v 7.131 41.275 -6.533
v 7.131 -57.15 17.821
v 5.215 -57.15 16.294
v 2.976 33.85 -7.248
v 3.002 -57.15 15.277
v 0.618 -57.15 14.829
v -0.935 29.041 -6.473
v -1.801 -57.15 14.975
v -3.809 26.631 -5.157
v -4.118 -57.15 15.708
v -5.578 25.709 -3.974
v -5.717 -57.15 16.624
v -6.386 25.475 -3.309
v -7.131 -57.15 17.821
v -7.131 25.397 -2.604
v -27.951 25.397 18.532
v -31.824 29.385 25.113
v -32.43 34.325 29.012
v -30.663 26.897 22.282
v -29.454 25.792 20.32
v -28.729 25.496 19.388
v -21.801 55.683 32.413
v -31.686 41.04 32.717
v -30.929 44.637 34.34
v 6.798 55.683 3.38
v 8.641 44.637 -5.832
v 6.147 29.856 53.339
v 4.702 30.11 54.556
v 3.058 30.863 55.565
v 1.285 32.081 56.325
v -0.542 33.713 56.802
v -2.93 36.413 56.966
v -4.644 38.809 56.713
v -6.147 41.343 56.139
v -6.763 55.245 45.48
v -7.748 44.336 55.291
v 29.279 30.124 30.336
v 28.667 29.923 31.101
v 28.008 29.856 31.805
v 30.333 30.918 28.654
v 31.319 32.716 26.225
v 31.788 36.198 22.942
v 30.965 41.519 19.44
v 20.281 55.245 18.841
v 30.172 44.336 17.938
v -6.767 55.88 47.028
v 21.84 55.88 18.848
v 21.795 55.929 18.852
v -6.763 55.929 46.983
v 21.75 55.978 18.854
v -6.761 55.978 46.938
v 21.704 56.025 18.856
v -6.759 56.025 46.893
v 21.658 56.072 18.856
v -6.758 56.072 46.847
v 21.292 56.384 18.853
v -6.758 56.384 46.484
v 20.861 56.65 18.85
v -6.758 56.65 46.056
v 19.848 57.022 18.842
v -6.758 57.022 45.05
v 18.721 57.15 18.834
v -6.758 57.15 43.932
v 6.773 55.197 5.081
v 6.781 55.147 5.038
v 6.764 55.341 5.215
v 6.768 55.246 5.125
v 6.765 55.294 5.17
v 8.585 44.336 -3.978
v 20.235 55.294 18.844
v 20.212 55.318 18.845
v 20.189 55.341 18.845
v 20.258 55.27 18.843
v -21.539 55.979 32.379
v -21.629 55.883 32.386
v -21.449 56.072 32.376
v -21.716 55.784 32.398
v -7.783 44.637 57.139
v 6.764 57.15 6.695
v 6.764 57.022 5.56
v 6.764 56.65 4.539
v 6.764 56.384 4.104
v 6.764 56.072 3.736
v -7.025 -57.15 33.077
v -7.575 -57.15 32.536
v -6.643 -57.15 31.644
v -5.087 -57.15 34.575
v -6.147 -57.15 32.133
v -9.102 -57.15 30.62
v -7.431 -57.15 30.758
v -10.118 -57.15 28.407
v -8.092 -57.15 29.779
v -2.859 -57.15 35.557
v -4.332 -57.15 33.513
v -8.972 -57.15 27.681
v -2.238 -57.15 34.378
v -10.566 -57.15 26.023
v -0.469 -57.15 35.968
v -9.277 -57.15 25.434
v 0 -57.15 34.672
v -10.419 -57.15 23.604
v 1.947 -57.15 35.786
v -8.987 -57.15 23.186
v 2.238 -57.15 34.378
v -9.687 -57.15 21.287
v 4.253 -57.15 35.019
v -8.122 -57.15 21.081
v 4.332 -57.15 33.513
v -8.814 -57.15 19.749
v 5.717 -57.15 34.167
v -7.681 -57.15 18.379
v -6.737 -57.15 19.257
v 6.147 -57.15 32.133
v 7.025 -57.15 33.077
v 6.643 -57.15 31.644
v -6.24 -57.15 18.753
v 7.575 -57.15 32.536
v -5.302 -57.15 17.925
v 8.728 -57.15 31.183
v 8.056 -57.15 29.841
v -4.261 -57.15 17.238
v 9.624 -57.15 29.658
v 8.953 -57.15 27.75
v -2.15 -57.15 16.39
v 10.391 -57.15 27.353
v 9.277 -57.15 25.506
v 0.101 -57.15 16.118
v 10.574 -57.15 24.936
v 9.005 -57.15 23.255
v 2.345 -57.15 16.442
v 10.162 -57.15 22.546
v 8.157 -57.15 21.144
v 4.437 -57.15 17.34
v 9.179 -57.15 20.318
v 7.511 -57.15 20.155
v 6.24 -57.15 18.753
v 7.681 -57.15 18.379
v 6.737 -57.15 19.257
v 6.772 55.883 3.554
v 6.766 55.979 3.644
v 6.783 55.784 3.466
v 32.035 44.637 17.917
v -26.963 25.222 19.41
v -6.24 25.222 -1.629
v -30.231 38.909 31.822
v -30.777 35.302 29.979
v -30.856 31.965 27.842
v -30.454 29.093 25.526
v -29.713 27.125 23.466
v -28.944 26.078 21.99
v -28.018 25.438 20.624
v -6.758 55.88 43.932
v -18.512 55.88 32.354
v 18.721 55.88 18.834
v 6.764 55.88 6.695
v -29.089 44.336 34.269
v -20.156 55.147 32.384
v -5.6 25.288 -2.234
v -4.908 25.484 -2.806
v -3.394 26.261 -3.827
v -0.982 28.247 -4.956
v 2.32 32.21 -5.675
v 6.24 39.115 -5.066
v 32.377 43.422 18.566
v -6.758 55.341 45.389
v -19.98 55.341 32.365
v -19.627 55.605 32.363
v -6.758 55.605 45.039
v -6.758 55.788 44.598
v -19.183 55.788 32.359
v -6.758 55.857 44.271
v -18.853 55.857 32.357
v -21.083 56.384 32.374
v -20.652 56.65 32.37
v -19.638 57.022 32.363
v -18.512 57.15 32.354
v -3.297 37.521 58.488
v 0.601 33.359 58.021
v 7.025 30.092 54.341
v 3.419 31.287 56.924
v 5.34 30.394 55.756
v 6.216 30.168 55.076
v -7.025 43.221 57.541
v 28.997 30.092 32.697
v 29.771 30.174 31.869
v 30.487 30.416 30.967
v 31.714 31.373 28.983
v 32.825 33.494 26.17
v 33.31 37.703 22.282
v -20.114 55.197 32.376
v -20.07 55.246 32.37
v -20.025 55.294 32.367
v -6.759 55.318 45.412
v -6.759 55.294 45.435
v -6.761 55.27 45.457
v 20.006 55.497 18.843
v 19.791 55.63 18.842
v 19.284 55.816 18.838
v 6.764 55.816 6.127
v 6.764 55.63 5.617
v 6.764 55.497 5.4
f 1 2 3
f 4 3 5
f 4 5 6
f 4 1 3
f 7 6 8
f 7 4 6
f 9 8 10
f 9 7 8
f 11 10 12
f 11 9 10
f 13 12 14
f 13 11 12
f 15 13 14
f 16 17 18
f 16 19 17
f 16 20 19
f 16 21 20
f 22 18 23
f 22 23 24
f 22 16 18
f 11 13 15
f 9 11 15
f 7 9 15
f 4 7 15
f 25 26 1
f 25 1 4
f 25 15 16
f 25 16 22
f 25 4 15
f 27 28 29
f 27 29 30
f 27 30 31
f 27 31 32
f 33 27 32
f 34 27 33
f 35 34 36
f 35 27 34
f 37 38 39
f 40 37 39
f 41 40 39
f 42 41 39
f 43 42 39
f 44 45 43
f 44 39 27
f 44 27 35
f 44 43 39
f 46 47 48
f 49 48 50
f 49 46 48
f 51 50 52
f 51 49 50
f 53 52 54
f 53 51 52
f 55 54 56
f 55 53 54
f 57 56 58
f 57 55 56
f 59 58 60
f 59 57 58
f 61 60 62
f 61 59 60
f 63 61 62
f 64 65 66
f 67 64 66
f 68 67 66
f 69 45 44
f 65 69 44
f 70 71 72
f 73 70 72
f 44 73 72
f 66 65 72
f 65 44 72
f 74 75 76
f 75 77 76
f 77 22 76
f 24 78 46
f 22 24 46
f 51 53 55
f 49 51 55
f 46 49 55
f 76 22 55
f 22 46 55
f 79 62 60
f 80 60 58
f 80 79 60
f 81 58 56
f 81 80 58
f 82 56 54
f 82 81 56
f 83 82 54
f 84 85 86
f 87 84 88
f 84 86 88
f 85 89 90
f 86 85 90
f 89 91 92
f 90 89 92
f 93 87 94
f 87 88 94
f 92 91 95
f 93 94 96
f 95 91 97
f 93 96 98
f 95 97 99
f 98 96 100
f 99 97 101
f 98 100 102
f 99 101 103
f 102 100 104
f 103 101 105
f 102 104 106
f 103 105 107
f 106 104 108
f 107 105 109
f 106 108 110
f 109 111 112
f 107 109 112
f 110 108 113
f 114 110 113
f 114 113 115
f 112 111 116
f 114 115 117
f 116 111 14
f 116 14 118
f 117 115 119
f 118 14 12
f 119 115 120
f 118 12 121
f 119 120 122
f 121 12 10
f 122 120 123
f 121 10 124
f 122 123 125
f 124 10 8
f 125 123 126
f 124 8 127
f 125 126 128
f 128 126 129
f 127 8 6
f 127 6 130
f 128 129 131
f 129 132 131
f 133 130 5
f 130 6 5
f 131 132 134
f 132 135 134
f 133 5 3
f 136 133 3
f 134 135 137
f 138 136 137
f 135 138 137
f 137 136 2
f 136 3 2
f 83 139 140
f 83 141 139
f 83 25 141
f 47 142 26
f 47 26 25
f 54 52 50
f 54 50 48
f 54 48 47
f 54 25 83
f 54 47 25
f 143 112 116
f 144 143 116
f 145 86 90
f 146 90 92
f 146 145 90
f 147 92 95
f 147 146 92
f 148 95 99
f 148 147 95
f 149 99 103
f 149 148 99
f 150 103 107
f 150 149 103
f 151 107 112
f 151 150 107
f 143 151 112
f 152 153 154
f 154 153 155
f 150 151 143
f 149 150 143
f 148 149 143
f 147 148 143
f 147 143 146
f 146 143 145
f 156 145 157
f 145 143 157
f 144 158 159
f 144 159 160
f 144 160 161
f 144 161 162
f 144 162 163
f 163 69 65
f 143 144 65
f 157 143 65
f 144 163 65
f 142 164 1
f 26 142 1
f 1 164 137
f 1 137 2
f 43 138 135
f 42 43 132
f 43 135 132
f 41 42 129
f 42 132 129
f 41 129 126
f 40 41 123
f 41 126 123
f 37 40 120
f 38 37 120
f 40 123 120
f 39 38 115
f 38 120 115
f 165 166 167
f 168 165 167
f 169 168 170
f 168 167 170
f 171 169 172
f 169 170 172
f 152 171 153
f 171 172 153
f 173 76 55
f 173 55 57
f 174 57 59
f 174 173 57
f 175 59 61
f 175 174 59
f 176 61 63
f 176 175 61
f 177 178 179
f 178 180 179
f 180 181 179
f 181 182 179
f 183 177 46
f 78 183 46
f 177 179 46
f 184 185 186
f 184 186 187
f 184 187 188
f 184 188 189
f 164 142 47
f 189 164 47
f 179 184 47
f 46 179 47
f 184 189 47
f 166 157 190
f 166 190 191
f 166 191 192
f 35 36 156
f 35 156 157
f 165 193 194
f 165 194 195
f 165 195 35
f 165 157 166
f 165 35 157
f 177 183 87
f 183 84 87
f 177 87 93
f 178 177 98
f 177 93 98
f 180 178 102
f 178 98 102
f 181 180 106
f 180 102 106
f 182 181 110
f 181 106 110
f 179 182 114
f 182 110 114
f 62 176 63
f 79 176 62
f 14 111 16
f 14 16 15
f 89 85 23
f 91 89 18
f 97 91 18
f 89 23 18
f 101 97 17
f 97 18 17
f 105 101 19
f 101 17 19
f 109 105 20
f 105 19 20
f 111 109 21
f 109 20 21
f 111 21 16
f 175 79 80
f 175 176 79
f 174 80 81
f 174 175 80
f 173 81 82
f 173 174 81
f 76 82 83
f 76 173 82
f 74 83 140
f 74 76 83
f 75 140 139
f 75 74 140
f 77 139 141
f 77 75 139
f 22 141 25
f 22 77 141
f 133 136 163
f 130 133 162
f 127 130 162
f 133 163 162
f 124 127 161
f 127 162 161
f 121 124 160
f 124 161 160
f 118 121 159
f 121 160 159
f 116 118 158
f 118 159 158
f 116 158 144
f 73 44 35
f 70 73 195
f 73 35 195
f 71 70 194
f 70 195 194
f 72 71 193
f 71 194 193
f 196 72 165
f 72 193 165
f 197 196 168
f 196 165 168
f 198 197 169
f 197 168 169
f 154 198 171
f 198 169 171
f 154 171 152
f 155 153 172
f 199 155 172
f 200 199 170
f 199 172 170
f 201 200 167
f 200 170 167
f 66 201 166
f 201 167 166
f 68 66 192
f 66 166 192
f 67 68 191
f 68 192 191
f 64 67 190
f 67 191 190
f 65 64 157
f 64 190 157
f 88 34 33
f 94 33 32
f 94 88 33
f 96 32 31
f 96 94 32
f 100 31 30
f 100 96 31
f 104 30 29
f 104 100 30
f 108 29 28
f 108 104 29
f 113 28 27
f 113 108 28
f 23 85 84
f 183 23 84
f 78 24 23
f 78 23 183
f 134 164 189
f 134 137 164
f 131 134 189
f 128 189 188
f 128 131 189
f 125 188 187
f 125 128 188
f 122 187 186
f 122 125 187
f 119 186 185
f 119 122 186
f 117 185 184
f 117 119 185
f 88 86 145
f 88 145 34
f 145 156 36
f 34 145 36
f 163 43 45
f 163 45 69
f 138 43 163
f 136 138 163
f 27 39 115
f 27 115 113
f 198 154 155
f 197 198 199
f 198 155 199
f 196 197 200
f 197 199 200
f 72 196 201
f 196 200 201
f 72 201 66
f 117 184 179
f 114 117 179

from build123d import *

# Parameters (mm, degrees)
SKETCH3_W           = 50.8
SKETCH3_H           = 114.3
BOSS_EXTRUDE5_DEPTH = 50.8
DRAFT2_ANGLE        = 7
CHAMFER22_SIZE      = 35.56
CHAMFER22_SIZE_2    = 36.100146123
CHAMFER26_SIZE      = 12.7
CHAMFER26_SIZE_2    = 10.982965741
CHAMFER27_SIZE      = 27.462526176
CHAMFER27_SIZE_2    = 20.32
CHAMFER28_SIZE      = 32.227786218
CHAMFER28_SIZE_2    = 20.32
FILLET36_R          = 2.54
FILLET41_R          = 10.16
SHELL2_T            = -1.27


with BuildPart() as part:
    # Sketch3 → Boss-Extrude5 (new body)
    with BuildSketch(Plane.XY):
        Rectangle(SKETCH3_W, SKETCH3_H)
    extrude(amount=BOSS_EXTRUDE5_DEPTH)

    # Draft2
    draft2_faces = [part.faces().sort_by_distance(p)[0] for p in [
        (0, 0, 50.8),
        (25.4, 0, 25.4),
        (0, 0, 0),
        (-25.4, 0, 25.4),
    ]]
    draft(draft2_faces, Plane(origin=(-25.4, -57.15, 50.8), x_dir=(0, 0, -1), z_dir=(0, -1, 0)), DRAFT2_ANGLE)

    # Chamfer22
    # the kernel refuses this chamfer: 36.100146123, 35.56 mm, written as the material it takes off along each edge
    with BuildSketch(Plane(origin=(14.164548215, -148.655411614, 39.564548215), x_dir=(0.04243090311992196, 0.11662547522410431, -0.9922691756721962), z_dir=(0.1209742911513545, 0.9852565360152932, 0.1209742911513545)), Plane(origin=(-50.669727097, 148.655411614, 76.069727097), x_dir=(-0.04243090311992182, 0.11662547522410434, -0.9922691756721962), z_dir=(0.1209742911513545, -0.9852565360152932, -0.1209742911513545))) as chamfer22_piece_1:
        Polygon((CHAMFER22_SIZE * 0.999610675702, CHAMFER22_SIZE * 0.0279015595125), (-CHAMFER22_SIZE_2 * 0.0427448365612, CHAMFER22_SIZE_2 * 0.999086021807), (0, 0), align=None)
    extrude(amount=301.759808092, mode=Mode.SUBTRACT)
    with BuildSketch(Plane(origin=(14.164548215, -148.655411614, 11.235451785), x_dir=(0.04160965436003197, 0.11672908614577471, 0.9922917701521116), z_dir=(0.1209742911513545, 0.9852565360152932, -0.1209742911513545)), Plane(origin=(-50.669727097, 148.655411614, -25.269727097), x_dir=(-0.04160965436003206, 0.11672908614577471, 0.9922917701521116), z_dir=(0.1209742911513545, -0.9852565360152932, 0.1209742911513545))) as chamfer22_piece_2:
        Polygon((CHAMFER22_SIZE_2 * 0.999633437363, -CHAMFER22_SIZE_2 * 0.0270738052216), (-CHAMFER22_SIZE * 0.0419175116292, -CHAMFER22_SIZE * 0.999121074855), (0, 0), align=None)
    extrude(amount=301.759808092, mode=Mode.SUBTRACT)

    # Chamfer26
    # the kernel refuses this chamfer: 12.7, 10.982965741 mm, written as the material it takes off along each edge
    with BuildSketch(Plane(origin=(62.353919786, 57.15, 45.600752144), x_dir=(-0.10253351623411874, -0.9895888066791988, 0.10099936506685082), z_dir=(-0.7017569520656596, 0, -0.7124164373647731))) as chamfer26_piece_1:
        Polygon((CHAMFER26_SIZE * 0.999621916911, CHAMFER26_SIZE * 0.0274958766106), (CHAMFER26_SIZE_2 * 0.14392356894, CHAMFER26_SIZE_2 * 0.989588806705), (0, 0), align=None)
    extrude(amount=116.368475455, mode=Mode.SUBTRACT)
    with BuildSketch(Plane(origin=(20.200752144, 57.15, 87.753919786), x_dir=(0.10099936506686123, -0.9895888066791988, -0.10253351623410831), z_dir=(-0.7124164373647012, 0, -0.7017569520657325))) as chamfer26_piece_2:
        Polygon((CHAMFER26_SIZE * 0.999621916911, -CHAMFER26_SIZE * 0.0274958766106), (CHAMFER26_SIZE_2 * 0.14392356894, -CHAMFER26_SIZE_2 * 0.989588806705), (0, 0), align=None)
    extrude(amount=116.368475455, mode=Mode.SUBTRACT)

    # Chamfer27
    # the kernel refuses this chamfer: 27.462526176, 20.32 mm, written as the material it takes off along each edge
    with BuildSketch(Plane(origin=(85.378052857, 57.15, -16.24516911), x_dir=(-0.10283002660704509, -0.9892058931774511, -0.10439198499403901), z_dir=(-0.7124164373647012, 0, 0.7017569520657325))) as chamfer27_piece_1:
        Polygon((CHAMFER27_SIZE * 0.999690938869, -CHAMFER27_SIZE * 0.0248601439751), (CHAMFER27_SIZE_2 * 0.146532252091, -CHAMFER27_SIZE_2 * 0.989205893177), (0, 0), align=None)
    extrude(amount=179.645229373, mode=Mode.SUBTRACT)

    # Chamfer28
    # the kernel refuses this chamfer: 32.227786218, 20.32 mm, written as the material it takes off along each edge
    with BuildSketch(Plane(origin=(50.702210768, 57.15, -69.17266836), x_dir=(0.10631921382033309, -0.9888013870052722, 0.10472841939548341), z_dir=(-0.7017569520656596, 0, 0.7124164373647731))) as chamfer28_piece_1:
        Polygon((CHAMFER28_SIZE * 0.999755198418, CHAMFER28_SIZE * 0.0221256235269), (CHAMFER28_SIZE_2 * 0.149237451923, CHAMFER28_SIZE_2 * 0.988801387005), (0, 0), align=None)
    extrude(amount=205.453325716, mode=Mode.SUBTRACT)

    # Fillet36
    fillet36_edges = [part.edges().sort_by_distance(p)[0] for p in [
        (13.620964483, 57.15, 11.778226285),
        (7.018121545, 57.15, 32.419663344),
        (-13.620970138, 57.15, 39.021756036),
        (-7.0181272, 57.15, 18.380318978),
    ]]
    fillet(fillet36_edges, radius=FILLET36_R)

    # Fillet41
    fillet41_edges = [part.edges().sort_by_distance(p)[0] for p in [
        (0, -13.528827954, 50.628730432),
        (0, -15.876331706, 0.368905118),
        (25.400607617, -13.597419467, 25.591459835),
        (-24.841008934, -15.876331706, 25.587241799),
    ]]
    fillet(fillet41_edges, radius=FILLET41_R)

    # Shell2
    shell2_openings = [part.faces().sort_by_distance(p)[0] for p in [
        (0, -57.15, 25.396792281),
    ]]
    offset(amount=SHELL2_T, openings=shell2_openings)


solid = part.part
